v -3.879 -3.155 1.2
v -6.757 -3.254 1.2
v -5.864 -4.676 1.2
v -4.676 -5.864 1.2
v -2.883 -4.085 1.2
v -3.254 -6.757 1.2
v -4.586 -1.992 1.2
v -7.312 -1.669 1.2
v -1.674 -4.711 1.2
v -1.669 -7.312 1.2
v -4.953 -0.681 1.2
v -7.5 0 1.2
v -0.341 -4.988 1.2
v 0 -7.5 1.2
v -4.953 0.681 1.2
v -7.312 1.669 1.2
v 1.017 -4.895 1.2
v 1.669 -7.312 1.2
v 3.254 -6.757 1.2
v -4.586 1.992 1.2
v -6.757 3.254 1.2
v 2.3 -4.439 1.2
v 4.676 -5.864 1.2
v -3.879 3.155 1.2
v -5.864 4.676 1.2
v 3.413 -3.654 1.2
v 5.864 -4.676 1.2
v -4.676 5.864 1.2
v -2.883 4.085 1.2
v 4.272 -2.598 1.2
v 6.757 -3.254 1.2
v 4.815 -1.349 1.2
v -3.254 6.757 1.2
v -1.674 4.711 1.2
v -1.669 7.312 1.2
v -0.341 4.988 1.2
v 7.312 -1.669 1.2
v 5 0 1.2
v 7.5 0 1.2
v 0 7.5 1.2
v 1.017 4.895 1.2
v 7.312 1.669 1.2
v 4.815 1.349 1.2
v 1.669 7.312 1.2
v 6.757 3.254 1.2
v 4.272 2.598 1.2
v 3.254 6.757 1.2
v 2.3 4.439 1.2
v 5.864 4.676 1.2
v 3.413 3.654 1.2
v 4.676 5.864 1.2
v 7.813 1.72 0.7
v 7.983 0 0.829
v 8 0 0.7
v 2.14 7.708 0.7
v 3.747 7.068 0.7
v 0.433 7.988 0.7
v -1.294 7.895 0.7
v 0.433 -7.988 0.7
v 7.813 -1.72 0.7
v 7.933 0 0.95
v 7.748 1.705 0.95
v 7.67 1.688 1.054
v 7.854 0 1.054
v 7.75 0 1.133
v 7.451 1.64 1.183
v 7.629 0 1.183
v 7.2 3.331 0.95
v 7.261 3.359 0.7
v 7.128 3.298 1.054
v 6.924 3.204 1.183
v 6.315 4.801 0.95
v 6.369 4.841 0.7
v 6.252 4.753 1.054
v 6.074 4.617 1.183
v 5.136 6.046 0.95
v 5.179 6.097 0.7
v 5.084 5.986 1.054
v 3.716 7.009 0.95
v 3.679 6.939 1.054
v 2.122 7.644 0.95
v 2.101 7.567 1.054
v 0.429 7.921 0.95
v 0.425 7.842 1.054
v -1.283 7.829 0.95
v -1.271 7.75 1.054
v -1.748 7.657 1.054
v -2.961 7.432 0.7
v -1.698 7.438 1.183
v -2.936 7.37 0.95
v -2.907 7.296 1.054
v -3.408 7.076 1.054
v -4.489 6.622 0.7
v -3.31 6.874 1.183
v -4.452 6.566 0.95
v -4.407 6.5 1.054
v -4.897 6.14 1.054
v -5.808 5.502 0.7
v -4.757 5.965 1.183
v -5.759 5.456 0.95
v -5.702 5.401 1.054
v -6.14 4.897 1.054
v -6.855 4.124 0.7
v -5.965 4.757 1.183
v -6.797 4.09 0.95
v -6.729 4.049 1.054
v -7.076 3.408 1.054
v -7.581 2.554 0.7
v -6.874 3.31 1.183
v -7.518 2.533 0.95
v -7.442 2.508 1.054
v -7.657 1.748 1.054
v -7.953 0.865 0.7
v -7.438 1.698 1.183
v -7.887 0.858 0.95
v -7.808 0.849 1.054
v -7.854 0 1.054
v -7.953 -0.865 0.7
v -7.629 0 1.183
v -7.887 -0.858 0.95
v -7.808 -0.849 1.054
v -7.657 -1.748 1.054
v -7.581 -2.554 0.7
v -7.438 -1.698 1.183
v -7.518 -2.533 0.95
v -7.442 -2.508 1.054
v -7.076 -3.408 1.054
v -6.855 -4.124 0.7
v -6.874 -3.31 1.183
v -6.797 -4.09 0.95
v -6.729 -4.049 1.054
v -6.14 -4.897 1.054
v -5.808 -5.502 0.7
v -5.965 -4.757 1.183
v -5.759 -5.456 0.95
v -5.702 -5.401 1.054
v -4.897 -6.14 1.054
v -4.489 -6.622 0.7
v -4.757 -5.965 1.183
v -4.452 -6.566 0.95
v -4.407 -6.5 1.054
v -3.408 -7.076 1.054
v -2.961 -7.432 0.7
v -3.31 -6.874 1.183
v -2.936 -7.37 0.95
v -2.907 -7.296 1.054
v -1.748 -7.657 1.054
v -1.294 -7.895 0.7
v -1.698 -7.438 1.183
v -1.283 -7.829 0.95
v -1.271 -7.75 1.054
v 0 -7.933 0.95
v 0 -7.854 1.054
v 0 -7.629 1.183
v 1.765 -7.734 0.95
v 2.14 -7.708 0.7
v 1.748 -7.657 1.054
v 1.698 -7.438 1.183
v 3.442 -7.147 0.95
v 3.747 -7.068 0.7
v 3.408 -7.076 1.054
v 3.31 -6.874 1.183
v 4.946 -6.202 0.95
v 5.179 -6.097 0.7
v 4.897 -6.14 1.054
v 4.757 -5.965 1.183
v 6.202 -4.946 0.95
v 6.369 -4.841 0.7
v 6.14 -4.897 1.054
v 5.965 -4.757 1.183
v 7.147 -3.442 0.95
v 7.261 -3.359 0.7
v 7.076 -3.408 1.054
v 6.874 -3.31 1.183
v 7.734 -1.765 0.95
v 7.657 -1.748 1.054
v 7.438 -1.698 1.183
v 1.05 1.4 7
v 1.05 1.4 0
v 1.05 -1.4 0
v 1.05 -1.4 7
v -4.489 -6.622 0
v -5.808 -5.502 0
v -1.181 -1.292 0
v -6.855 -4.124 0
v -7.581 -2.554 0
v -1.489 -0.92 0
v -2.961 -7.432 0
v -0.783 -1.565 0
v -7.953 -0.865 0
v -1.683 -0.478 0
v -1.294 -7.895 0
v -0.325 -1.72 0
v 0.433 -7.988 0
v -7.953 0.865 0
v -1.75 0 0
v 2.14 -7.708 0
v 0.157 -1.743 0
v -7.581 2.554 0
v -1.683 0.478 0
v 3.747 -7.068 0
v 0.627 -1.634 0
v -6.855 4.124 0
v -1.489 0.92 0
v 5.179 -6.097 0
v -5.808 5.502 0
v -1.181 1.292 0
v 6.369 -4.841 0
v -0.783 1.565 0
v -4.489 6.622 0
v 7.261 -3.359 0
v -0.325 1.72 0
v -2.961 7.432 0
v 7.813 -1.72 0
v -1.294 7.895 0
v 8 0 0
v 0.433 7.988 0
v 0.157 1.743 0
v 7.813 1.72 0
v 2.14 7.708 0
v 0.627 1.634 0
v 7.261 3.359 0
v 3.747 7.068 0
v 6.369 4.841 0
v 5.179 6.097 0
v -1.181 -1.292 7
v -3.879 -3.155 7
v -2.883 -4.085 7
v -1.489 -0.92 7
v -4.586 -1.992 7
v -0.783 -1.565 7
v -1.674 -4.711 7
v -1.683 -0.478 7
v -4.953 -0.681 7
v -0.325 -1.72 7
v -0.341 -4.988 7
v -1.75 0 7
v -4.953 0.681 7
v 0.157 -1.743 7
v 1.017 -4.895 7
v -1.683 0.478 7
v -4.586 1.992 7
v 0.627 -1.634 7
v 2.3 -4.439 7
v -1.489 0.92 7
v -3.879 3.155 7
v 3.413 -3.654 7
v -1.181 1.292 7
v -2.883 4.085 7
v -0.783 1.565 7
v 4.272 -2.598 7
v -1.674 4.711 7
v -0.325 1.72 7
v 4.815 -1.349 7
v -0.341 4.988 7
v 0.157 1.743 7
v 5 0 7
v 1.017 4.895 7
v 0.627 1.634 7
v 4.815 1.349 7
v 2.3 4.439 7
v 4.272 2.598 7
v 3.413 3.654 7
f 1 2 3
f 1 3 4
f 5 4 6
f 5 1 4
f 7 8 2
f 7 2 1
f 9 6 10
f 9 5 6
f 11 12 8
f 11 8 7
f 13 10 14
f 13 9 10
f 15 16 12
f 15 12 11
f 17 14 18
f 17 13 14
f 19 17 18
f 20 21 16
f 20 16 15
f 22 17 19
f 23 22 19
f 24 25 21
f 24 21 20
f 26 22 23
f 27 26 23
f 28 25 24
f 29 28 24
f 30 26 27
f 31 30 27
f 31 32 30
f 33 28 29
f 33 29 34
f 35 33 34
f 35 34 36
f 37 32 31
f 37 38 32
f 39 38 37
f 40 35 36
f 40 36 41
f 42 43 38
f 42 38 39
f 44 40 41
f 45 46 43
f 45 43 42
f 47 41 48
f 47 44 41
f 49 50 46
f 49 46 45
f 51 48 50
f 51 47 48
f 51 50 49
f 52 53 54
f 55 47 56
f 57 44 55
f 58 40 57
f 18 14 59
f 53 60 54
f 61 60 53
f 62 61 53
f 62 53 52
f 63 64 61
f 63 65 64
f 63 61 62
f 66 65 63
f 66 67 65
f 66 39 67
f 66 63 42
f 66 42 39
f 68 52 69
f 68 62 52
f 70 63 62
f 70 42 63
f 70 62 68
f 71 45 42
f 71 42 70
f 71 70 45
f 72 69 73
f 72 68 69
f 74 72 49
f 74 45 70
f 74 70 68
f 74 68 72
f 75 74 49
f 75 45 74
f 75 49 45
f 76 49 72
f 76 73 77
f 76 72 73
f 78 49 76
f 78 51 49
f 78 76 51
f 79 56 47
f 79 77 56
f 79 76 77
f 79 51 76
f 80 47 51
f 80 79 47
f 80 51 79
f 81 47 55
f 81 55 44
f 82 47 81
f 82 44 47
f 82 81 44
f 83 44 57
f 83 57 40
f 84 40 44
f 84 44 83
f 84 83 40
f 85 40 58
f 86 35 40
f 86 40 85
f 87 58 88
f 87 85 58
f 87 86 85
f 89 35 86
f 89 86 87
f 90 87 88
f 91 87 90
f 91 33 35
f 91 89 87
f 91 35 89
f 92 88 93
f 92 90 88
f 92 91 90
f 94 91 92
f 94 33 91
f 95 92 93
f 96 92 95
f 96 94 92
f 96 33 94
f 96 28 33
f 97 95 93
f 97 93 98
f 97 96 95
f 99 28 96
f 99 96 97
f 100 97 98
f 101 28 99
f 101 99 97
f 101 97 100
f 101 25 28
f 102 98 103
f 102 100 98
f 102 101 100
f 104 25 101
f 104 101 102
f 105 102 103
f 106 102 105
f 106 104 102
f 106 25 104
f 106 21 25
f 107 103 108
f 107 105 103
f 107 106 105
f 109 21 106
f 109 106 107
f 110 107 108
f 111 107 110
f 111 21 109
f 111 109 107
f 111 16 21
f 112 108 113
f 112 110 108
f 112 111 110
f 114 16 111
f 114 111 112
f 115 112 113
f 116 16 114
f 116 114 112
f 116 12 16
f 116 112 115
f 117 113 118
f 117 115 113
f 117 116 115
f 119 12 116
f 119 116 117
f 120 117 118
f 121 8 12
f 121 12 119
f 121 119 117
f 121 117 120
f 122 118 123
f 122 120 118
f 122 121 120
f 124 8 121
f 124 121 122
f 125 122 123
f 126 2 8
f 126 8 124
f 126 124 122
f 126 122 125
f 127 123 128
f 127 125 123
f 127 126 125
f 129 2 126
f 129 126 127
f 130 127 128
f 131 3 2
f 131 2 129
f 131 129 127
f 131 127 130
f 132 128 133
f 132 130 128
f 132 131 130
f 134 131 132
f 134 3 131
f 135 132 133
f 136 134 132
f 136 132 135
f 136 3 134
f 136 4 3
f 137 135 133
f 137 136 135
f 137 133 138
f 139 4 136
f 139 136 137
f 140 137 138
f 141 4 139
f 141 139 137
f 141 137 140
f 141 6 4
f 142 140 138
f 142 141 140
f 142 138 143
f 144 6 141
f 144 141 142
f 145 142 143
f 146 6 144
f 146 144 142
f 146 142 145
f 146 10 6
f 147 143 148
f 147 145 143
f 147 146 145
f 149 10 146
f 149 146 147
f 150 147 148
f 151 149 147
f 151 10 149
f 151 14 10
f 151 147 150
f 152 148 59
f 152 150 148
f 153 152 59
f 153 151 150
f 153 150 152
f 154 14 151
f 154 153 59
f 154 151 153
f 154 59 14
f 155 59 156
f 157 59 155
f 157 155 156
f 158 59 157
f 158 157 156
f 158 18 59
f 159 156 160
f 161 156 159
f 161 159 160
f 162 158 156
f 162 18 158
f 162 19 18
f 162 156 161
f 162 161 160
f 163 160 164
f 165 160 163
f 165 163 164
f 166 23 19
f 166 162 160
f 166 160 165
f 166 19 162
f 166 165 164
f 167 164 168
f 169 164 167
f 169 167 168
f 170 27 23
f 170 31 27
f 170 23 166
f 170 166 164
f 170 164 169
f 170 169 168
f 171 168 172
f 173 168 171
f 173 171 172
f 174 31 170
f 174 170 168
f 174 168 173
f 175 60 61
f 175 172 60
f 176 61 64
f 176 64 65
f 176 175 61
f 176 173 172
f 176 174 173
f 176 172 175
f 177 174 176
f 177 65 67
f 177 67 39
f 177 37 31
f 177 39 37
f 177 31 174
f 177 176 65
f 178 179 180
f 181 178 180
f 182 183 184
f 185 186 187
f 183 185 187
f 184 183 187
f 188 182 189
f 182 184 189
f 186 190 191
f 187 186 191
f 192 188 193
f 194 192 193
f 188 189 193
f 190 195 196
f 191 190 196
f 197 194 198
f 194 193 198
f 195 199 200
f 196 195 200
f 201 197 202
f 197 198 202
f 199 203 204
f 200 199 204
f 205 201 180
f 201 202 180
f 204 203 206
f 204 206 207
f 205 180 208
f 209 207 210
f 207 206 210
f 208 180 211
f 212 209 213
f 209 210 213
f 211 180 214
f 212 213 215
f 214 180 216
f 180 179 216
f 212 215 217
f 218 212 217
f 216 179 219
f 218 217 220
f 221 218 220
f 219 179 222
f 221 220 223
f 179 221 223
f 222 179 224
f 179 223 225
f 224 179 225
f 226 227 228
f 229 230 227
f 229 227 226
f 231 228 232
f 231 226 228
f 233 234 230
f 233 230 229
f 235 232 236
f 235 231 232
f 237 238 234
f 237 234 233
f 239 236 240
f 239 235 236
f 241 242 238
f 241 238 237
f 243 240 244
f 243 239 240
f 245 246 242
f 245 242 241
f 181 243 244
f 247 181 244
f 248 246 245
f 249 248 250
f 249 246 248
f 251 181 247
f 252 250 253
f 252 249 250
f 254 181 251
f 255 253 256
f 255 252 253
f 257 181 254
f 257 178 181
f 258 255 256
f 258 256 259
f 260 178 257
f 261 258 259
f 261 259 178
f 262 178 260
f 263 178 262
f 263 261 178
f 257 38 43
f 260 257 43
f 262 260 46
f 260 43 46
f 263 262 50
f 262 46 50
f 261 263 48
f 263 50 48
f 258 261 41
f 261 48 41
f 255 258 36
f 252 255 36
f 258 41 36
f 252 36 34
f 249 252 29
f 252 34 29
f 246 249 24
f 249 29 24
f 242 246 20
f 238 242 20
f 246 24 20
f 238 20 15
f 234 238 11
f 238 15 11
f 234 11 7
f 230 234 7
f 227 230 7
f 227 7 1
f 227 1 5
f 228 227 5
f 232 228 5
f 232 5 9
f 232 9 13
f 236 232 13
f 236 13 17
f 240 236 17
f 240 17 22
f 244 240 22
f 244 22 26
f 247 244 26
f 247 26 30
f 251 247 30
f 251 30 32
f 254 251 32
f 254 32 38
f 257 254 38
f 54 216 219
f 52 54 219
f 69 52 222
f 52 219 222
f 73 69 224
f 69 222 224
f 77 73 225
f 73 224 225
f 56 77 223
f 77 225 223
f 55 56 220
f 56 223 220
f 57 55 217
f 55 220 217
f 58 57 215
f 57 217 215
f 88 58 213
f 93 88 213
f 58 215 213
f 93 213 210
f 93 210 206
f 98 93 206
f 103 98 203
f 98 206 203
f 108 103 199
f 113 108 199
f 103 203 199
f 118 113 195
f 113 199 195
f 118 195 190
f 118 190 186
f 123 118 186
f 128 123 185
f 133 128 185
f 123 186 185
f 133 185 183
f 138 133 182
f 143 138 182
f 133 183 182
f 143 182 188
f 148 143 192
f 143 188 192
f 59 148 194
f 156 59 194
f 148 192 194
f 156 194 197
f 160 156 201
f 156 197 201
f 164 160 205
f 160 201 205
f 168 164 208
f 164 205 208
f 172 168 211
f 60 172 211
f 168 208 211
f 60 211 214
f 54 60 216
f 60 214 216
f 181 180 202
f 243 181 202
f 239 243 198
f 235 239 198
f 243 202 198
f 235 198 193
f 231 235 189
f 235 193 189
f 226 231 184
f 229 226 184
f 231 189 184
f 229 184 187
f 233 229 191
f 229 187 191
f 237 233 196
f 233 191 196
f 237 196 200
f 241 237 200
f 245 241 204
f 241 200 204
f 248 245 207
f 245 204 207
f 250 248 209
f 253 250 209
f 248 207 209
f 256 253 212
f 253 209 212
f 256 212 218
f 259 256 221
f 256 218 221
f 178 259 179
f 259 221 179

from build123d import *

# Parameters (mm, degrees)
F0_R     = 5
F1_DEPTH = 7
F0_R_2   = 8
F2_DEPTH = 1.2
F3_R     = 0.5


with BuildPart() as f1:
    # F0 (on Top) → F1 (new body)
    with BuildSketch(Plane.XY):
        Circle(F0_R)
        with BuildLine():
            ThreePointArc((1.05, 1.4), (1.5652475842, 0.7826237921), (1.75, 0))
            ThreePointArc((1.75, 0), (1.5652475842, -0.7826237921), (1.05, -1.4))
            ThreePointArc((1.05, -1.4), (-0.7826237921, -1.5652475842), (-1.75, 0))
            ThreePointArc((-1.75, 0), (-0.7826237921, 1.5652475842), (1.05, 1.4))
        make_face(mode=Mode.SUBTRACT)
        with BuildLine():
            ThreePointArc((1.05, -1.4), (1.5652475842, -0.7826237921), (1.75, 0))
            ThreePointArc((1.75, 0), (1.5652475842, 0.7826237921), (1.05, 1.4))
            Line((1.05, 1.4), (1.05, 0))
            Line((1.05, 0), (1.05, -1.4))
        make_face()
    extrude(amount=F1_DEPTH)

    # F0 (on Top) → F2 (join)
    with BuildSketch(Plane.XY):
        Circle(F0_R_2)
        Circle(F0_R, mode=Mode.SUBTRACT)
    extrude(amount=F2_DEPTH)

    # F3
    f3_edges = [f1.edges().sort_by_distance(p)[0] for p in [
        (-8, 0, 1.2),
    ]]
    fillet(f3_edges, radius=F3_R)


solid = f1.part
